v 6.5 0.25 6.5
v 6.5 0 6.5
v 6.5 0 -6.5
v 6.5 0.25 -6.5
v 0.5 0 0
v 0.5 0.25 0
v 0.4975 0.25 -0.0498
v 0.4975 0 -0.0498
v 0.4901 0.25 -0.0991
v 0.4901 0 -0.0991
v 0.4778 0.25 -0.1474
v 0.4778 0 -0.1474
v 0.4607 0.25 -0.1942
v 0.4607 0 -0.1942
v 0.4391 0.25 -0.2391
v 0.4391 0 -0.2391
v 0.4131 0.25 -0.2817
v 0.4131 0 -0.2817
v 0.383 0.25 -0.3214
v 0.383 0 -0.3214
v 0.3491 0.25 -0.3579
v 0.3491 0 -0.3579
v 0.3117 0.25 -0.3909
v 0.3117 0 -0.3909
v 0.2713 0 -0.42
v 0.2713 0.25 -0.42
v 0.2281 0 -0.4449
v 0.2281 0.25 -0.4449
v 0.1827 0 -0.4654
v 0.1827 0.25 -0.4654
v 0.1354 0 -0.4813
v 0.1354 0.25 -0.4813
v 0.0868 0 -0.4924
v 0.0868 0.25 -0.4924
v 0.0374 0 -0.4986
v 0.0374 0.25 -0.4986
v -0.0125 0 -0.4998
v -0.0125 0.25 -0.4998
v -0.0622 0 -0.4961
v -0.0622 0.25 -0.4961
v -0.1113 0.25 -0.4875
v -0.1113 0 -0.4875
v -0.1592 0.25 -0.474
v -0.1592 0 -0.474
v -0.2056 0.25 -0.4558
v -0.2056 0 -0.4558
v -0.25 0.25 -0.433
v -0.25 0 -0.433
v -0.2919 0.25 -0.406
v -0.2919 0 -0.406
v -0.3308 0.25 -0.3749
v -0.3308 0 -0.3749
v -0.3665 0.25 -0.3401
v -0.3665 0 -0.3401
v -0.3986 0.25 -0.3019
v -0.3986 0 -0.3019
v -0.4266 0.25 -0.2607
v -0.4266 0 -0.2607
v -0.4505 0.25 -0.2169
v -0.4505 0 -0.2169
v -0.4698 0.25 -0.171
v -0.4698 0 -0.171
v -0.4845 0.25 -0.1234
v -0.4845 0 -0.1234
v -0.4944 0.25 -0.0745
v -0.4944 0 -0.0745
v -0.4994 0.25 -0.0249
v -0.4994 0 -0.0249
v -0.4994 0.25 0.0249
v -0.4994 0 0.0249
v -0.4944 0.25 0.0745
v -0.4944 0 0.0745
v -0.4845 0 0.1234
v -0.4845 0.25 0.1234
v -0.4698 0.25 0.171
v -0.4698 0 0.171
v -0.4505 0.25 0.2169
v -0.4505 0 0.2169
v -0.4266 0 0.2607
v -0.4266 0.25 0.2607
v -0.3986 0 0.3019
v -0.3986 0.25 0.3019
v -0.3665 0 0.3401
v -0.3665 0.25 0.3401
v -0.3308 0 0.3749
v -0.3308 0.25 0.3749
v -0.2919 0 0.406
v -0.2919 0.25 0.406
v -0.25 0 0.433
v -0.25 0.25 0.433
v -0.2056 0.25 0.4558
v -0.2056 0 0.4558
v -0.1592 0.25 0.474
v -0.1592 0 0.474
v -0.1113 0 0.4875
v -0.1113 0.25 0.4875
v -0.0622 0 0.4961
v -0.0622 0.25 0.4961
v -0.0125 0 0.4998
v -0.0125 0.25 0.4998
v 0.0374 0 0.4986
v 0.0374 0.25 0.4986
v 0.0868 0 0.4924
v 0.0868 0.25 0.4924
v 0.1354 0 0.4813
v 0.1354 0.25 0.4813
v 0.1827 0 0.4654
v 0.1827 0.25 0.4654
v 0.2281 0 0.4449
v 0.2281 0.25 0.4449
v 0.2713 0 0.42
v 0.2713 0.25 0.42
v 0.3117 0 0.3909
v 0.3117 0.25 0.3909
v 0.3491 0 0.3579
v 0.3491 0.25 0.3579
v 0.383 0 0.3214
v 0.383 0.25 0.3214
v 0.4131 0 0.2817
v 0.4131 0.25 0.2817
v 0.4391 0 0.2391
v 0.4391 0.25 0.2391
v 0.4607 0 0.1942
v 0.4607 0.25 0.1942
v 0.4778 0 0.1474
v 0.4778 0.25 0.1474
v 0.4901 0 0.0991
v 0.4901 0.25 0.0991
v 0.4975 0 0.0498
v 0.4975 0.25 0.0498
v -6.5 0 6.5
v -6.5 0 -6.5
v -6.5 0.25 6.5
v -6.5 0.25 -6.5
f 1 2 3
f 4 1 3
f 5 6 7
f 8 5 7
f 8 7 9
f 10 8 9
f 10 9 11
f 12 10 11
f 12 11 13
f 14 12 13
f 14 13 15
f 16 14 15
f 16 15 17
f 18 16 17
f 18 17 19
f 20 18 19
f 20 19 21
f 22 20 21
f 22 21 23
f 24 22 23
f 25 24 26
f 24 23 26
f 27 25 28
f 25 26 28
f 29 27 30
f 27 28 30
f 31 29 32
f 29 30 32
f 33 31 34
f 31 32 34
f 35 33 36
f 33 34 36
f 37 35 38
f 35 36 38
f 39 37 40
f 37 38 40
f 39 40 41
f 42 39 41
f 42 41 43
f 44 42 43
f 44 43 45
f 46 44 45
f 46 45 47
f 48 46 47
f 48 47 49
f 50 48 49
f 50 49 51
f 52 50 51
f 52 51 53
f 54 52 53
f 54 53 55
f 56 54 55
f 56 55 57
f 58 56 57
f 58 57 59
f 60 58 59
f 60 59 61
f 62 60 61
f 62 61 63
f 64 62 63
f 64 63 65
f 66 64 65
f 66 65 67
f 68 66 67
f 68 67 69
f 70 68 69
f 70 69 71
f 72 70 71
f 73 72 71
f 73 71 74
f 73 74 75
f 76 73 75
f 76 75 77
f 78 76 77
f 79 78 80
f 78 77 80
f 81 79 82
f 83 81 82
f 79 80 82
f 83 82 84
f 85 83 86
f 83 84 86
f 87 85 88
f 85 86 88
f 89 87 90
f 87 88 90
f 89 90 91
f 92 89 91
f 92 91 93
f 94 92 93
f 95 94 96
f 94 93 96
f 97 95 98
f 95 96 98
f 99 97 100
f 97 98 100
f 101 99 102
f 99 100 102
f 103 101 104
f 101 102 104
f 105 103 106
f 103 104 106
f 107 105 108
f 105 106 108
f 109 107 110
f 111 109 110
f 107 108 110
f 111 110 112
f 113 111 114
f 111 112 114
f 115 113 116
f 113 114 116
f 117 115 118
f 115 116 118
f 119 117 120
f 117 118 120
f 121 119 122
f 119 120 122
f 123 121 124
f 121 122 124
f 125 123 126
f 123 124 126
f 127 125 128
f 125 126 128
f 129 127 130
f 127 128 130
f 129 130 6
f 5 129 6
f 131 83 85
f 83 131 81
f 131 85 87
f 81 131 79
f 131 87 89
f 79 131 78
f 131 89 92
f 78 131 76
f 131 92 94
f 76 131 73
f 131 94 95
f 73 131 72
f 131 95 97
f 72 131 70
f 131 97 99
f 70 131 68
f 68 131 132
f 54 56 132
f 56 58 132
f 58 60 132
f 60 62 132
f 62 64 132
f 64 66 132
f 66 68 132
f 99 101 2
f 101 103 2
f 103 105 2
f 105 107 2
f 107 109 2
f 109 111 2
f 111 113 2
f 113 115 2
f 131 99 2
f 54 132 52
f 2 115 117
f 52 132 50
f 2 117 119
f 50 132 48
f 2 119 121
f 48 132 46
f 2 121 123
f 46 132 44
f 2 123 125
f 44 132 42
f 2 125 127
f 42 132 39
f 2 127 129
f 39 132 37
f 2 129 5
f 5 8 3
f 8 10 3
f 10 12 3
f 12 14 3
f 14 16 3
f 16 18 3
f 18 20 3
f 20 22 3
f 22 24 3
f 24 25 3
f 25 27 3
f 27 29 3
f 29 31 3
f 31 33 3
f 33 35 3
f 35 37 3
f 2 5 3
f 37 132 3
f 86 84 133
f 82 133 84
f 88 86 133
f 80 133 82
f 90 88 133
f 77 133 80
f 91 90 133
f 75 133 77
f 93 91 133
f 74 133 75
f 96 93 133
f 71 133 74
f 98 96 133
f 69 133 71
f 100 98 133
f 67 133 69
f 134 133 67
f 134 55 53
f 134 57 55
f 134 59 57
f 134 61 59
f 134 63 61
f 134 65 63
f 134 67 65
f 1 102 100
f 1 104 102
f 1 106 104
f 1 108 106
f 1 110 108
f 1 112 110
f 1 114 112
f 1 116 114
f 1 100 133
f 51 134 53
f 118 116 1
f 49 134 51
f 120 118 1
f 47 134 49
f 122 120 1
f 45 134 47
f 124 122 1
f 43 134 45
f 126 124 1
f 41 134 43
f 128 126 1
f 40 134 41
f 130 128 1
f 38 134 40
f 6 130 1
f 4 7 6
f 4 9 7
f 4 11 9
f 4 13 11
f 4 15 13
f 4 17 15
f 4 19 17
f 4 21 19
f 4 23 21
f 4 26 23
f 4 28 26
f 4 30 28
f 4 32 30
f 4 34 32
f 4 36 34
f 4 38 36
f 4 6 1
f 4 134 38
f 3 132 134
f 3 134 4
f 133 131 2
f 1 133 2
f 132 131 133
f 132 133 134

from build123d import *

# Parameters (mm, degrees)
SKETCH1_W       = 13
SKETCH1_H       = 13
MESH_DEPTH      = 0.25
HOLE_DEPTH      = 10
HOLE_DEPTH_BACK = 10
SKETCH2_R       = 0.5


with BuildPart() as part:
    # Sketch1 → Mesh (new body)
    with BuildSketch(Plane(origin=(0, 0, 0), x_dir=(1, 0, 0), z_dir=(0, 1, 0))):
        Rectangle(SKETCH1_W, SKETCH1_H)
    extrude(amount=MESH_DEPTH)

    # Sketch2 → Hole (cut, two sides: drawn at the far end of the back side and taken through both)
    with BuildSketch(Plane(origin=(0, 0.25, 0), x_dir=(1, 0, 0), z_dir=(0, 1, 0)).offset(-HOLE_DEPTH_BACK)):
        Circle(SKETCH2_R)
    extrude(amount=HOLE_DEPTH + HOLE_DEPTH_BACK, mode=Mode.SUBTRACT)


solid = part.part
